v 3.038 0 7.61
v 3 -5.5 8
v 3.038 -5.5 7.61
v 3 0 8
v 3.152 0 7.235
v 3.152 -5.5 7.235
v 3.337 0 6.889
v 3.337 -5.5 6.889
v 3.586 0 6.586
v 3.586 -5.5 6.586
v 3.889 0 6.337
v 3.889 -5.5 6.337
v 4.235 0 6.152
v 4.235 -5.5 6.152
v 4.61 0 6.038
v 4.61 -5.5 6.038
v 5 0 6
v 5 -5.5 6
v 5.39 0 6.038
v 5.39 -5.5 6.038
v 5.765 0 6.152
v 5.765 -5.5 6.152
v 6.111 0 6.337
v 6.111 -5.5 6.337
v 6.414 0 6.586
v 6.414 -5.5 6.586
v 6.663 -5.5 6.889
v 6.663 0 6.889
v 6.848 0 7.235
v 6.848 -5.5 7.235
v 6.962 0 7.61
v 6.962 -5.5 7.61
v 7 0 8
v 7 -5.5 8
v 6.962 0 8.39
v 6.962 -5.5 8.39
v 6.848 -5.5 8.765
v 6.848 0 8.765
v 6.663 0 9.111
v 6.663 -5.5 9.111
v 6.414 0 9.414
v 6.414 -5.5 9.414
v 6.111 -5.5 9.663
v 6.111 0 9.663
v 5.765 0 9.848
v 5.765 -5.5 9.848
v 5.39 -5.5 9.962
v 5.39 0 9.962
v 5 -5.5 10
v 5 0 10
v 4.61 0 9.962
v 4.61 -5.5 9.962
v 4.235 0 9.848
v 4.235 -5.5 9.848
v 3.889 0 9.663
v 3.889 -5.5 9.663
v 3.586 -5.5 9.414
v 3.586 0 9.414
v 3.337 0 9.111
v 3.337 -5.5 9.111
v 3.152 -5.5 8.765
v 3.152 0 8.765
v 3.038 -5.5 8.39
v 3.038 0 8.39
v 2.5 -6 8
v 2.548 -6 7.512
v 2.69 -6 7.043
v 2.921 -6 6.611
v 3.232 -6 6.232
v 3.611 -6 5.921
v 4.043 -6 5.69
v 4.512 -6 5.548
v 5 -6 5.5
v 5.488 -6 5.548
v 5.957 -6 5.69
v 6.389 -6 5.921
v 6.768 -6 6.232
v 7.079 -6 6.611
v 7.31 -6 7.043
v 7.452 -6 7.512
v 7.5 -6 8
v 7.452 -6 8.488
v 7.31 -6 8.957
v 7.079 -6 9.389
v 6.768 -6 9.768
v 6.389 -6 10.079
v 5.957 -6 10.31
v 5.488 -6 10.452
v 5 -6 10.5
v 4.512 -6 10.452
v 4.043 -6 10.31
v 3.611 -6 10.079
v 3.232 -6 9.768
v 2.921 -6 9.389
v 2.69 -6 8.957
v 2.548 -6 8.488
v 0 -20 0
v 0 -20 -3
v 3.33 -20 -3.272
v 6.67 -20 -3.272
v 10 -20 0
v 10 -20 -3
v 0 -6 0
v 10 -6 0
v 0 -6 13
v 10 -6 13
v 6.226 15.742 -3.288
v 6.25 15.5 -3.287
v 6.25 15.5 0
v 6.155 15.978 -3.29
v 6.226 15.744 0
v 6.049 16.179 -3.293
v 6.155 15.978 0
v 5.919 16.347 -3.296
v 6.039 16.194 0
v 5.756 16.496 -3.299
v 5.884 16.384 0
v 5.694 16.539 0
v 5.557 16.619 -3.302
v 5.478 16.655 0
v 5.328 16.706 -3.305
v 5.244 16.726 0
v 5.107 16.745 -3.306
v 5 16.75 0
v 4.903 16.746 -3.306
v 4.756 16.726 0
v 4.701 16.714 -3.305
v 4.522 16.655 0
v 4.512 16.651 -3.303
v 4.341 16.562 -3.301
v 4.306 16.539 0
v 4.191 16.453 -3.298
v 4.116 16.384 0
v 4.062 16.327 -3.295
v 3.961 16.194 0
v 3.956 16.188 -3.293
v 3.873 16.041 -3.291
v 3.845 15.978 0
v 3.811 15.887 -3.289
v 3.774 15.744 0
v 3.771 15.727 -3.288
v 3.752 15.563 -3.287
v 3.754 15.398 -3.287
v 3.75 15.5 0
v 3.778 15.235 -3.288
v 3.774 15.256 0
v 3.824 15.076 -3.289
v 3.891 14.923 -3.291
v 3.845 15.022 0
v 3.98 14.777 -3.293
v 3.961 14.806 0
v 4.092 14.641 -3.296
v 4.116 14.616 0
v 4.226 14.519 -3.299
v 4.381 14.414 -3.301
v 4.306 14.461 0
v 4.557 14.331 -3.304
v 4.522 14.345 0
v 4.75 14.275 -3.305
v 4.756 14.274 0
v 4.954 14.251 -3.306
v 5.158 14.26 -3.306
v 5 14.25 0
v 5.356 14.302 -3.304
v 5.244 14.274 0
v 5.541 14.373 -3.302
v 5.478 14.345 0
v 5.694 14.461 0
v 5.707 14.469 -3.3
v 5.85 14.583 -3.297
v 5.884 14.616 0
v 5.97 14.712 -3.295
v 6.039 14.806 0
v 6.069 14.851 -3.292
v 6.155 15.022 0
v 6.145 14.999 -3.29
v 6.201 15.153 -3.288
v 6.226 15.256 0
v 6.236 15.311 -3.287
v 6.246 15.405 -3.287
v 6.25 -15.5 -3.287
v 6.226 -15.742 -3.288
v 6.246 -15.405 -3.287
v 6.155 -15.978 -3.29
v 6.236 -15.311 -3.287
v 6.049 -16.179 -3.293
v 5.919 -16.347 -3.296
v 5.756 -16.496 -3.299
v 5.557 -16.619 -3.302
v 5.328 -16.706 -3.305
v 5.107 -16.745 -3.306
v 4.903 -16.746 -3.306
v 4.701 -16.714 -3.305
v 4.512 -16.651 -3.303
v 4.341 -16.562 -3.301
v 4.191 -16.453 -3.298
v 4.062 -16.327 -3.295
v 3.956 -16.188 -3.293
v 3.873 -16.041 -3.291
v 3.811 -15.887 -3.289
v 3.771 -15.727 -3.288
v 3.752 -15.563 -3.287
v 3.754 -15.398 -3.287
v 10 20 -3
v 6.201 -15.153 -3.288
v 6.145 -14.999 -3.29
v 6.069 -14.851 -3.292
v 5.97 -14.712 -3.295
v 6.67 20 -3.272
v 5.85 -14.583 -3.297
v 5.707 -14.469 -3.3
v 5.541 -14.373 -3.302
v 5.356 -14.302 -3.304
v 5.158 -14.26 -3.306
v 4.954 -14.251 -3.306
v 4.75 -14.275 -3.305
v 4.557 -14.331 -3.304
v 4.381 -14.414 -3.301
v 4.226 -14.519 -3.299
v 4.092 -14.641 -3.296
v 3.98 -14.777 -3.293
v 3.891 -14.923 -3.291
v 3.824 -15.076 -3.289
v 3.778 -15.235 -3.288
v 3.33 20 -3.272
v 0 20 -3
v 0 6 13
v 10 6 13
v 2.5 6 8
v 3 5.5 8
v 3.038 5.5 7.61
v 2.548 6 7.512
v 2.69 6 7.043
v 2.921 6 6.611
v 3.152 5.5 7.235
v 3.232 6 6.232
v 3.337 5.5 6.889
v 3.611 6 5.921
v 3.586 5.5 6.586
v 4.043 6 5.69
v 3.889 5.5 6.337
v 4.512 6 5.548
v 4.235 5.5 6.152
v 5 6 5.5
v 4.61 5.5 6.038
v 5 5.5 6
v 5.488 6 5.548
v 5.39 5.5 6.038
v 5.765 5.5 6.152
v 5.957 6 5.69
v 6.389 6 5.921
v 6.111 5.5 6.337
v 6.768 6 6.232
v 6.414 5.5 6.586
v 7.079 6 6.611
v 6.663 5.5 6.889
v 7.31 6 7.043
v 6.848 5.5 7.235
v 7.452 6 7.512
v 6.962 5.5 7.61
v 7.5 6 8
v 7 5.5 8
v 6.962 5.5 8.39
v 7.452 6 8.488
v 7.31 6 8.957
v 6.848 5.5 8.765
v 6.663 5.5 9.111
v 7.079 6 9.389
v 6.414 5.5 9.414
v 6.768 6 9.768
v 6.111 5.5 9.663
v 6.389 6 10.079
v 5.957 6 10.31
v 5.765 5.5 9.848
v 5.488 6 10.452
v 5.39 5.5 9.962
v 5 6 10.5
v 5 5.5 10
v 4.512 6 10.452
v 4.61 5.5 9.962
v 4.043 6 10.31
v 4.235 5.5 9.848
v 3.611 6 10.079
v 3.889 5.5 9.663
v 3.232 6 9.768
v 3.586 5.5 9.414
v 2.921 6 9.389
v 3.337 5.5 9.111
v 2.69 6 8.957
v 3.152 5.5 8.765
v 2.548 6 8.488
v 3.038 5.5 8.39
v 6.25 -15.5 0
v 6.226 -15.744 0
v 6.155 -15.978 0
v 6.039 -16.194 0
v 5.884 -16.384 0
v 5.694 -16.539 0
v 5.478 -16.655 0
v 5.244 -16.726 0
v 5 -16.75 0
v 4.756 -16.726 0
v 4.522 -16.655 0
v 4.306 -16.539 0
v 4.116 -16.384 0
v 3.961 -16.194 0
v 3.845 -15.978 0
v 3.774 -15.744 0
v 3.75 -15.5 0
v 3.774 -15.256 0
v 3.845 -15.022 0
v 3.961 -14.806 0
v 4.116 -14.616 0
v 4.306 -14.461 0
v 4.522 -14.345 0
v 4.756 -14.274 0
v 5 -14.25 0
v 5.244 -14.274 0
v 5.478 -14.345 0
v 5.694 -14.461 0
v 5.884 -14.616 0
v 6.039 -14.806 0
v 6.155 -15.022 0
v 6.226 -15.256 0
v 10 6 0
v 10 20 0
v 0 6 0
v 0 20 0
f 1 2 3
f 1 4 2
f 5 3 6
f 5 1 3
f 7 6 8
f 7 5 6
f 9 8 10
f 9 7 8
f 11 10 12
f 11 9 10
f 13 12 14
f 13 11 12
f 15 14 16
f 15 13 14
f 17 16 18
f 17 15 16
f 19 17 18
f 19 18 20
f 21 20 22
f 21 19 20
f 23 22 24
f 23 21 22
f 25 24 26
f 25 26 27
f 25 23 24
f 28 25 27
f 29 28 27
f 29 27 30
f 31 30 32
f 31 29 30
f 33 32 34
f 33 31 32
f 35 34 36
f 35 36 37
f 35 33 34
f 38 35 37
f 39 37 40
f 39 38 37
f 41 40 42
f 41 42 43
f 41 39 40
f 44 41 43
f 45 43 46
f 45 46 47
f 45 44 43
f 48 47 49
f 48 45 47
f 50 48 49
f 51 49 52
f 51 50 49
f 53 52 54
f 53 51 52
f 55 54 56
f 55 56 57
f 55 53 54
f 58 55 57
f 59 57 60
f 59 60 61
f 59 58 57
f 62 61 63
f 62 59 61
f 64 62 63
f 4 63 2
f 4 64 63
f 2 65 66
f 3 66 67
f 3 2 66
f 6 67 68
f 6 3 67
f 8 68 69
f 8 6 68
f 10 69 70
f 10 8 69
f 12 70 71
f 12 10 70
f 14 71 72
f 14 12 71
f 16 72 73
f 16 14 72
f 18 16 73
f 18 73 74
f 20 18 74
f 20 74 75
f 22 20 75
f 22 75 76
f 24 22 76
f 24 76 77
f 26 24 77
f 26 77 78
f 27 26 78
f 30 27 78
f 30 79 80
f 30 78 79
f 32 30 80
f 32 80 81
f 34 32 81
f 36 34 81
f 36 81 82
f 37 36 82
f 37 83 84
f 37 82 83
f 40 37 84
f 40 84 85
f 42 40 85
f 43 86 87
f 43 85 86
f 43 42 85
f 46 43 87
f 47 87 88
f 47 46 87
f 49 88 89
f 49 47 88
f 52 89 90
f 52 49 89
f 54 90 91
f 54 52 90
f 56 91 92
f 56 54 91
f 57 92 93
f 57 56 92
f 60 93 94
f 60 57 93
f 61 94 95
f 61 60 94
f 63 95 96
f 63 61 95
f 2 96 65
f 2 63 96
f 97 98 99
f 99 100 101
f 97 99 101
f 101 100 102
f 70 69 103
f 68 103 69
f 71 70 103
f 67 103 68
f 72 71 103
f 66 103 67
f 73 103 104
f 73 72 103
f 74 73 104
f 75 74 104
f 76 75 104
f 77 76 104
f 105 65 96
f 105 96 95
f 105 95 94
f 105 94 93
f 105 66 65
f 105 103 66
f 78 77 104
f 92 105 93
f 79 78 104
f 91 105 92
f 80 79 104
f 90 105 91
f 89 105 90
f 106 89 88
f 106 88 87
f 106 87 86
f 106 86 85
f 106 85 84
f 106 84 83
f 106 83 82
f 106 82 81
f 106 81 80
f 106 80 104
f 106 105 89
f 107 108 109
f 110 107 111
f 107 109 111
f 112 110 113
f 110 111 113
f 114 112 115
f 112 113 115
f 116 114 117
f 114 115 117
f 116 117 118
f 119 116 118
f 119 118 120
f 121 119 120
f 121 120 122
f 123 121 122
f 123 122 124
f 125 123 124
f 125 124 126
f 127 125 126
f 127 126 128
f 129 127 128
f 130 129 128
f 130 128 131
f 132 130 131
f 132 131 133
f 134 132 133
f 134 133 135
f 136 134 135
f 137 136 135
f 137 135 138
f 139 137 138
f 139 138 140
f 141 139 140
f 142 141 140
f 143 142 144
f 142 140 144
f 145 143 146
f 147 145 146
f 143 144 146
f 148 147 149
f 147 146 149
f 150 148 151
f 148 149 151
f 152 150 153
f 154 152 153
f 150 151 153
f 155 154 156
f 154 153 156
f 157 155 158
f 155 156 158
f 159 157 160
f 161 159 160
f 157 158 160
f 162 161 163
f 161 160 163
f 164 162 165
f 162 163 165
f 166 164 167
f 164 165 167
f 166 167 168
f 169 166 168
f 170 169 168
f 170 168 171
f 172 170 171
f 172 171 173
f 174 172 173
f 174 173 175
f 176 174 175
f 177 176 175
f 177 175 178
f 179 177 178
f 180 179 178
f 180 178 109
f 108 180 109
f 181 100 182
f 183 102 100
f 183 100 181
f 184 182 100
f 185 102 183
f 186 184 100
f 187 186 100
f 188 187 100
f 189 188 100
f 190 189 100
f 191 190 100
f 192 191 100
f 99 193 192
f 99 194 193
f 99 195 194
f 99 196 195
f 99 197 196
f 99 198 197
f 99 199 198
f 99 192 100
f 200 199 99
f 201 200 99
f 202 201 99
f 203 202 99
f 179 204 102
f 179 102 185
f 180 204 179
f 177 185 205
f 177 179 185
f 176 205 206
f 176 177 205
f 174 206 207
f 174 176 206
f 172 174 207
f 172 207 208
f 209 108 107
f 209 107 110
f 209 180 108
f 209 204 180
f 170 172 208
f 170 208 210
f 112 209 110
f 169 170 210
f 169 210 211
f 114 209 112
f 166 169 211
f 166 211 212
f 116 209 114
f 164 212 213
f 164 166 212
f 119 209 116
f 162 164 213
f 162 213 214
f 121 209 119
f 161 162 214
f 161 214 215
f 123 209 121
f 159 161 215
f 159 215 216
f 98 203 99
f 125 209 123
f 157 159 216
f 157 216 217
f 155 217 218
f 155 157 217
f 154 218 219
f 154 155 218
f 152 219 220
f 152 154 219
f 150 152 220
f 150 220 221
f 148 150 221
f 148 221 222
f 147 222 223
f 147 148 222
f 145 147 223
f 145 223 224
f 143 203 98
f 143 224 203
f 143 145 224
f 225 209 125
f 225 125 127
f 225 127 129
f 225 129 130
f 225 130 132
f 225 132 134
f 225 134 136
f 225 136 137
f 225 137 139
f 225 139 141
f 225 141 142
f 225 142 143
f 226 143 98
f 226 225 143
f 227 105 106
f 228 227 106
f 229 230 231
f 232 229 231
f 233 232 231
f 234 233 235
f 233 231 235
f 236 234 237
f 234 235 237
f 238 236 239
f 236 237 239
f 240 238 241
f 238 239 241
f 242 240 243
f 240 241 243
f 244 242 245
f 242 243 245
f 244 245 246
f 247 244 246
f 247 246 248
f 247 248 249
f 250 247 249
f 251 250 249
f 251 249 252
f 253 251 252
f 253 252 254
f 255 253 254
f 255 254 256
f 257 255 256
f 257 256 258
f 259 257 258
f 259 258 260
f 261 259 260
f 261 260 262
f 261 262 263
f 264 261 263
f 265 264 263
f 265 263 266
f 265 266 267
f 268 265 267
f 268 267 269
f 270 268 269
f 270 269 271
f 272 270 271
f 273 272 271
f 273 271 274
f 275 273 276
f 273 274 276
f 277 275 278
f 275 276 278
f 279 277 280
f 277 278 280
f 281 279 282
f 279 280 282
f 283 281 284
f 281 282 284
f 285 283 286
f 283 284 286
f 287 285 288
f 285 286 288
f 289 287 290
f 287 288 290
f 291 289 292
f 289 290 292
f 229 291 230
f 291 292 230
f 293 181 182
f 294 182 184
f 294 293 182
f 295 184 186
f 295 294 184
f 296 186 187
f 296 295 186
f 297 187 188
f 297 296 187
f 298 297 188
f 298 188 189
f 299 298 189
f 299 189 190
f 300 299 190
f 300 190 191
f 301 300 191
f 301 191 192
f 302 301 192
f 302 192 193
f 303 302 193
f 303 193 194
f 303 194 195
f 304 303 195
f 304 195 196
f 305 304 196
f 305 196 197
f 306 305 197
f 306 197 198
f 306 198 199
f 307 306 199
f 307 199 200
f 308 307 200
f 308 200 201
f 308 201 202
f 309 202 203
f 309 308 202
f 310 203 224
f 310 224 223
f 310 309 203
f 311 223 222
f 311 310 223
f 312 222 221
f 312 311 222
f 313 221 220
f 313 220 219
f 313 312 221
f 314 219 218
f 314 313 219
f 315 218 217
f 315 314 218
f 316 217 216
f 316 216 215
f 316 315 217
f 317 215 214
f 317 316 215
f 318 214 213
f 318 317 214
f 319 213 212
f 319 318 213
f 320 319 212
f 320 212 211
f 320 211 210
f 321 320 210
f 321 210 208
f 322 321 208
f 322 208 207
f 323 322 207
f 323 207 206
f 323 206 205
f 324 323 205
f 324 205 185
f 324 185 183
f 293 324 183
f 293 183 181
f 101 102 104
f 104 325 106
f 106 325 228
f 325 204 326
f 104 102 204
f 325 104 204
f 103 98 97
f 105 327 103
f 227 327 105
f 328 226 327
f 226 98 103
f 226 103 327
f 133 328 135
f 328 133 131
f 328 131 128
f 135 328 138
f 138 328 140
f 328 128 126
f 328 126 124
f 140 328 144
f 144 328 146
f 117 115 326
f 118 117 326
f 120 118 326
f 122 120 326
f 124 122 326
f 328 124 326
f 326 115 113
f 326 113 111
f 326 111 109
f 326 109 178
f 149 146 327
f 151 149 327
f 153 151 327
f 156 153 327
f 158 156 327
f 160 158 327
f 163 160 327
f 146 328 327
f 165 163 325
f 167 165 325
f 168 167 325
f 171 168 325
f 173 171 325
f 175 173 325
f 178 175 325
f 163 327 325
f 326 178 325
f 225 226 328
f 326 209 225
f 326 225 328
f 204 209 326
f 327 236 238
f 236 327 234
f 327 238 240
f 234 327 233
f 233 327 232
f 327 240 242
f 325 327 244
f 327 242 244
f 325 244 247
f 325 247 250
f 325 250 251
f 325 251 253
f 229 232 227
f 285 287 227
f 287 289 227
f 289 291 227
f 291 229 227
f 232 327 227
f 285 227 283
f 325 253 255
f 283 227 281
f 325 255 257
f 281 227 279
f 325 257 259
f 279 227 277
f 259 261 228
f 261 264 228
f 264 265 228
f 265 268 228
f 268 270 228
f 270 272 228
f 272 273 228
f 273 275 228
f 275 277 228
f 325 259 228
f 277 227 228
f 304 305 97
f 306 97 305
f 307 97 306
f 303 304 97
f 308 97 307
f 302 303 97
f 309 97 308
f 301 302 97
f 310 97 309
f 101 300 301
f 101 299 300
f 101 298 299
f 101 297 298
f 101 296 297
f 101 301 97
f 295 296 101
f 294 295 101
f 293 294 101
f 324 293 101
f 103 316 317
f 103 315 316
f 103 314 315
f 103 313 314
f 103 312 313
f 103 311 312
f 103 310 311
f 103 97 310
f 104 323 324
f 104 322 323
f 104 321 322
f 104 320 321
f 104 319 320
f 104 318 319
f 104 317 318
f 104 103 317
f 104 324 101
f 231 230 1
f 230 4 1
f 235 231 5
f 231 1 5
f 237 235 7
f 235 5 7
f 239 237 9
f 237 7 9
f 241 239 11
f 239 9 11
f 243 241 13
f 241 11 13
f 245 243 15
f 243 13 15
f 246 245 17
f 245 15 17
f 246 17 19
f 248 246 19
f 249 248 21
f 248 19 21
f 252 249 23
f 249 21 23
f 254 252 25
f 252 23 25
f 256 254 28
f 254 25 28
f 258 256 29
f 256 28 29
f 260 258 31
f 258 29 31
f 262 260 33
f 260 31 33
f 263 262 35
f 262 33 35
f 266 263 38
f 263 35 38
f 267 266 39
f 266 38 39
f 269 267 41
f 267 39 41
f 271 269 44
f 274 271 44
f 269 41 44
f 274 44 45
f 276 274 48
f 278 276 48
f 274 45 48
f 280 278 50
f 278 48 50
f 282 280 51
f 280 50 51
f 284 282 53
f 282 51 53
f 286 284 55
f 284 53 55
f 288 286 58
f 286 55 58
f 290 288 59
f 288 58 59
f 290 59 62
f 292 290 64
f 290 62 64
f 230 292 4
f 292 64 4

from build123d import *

# Parameters (mm, degrees)
BOSS_EXTRU_1_DEPTH         = 20
ESQUISSE2_W                = 10
ESQUISSE2_H                = 13
BOSS_EXTRU_2_DEPTH         = 6
D_GAGEMENT_M41_D           = 4
D_GAGEMENT_M41_CSINK_D     = 5
D_GAGEMENT_M41_CSINK_ANGLE = 90
D_GAGEMENT_M2_51_D         = 2.5


with BuildPart() as part:
    # Esquisse1 → Boss.-Extru.1 (new body)
    with BuildSketch(Plane(origin=(0, 0, 0), x_dir=(1, 0, 0), z_dir=(0, 1, 0))):
        with BuildLine():
            Line((0, 0), (10, 0))
            Line((10, 0), (10, 3))
            ThreePointArc((10, 3), (5, 3.306020101), (0, 3))
            Line((0, 3), (0, 0))
        make_face()
    boss_extru_1 = extrude(amount=BOSS_EXTRU_1_DEPTH)

    # Esquisse2 → Boss.-Extru.2 (add)
    with BuildSketch(Plane.XZ):
        with Locations((5, 6.5)):
            Rectangle(ESQUISSE2_W, ESQUISSE2_H)
    boss_extru_2 = extrude(amount=-BOSS_EXTRU_2_DEPTH)

    # Dégagement M41 (through all)
    with Locations(Plane(origin=(0, 6, 0), x_dir=(1, 0, 0), z_dir=(0, 1, 0))):
        with Locations((5, -8)):
            d_gagement_m41 = CounterSinkHole(D_GAGEMENT_M41_D / 2, D_GAGEMENT_M41_CSINK_D / 2, counter_sink_angle=D_GAGEMENT_M41_CSINK_ANGLE)

    # Dégagement M2.51 (through all)
    with Locations(Plane(origin=(5, 15.5, -3.306020101), x_dir=(-1, 0, 0), z_dir=(0, 0, -1))):
        with Locations((0, 0)):
            d_gagement_m2_51 = Hole(D_GAGEMENT_M2_51_D / 2)

    # Symétrie1: Boss.-Extru.1, Boss.-Extru.2, Dégagement M41, Dégagement M2.51 across plane
    add(boss_extru_1.mirror(Plane(origin=(5, 0, 37.693979899), x_dir=(0, 0, 1), z_dir=(0, -1, 0))))
    add(boss_extru_2.mirror(Plane(origin=(5, 0, 37.693979899), x_dir=(0, 0, 1), z_dir=(0, -1, 0))))
    add(d_gagement_m41.mirror(Plane(origin=(5, 0, 37.693979899), x_dir=(0, 0, 1), z_dir=(0, -1, 0))), mode=Mode.SUBTRACT)
    add(d_gagement_m2_51.mirror(Plane(origin=(5, 0, 37.693979899), x_dir=(0, 0, 1), z_dir=(0, -1, 0))), mode=Mode.SUBTRACT)


solid = part.part
